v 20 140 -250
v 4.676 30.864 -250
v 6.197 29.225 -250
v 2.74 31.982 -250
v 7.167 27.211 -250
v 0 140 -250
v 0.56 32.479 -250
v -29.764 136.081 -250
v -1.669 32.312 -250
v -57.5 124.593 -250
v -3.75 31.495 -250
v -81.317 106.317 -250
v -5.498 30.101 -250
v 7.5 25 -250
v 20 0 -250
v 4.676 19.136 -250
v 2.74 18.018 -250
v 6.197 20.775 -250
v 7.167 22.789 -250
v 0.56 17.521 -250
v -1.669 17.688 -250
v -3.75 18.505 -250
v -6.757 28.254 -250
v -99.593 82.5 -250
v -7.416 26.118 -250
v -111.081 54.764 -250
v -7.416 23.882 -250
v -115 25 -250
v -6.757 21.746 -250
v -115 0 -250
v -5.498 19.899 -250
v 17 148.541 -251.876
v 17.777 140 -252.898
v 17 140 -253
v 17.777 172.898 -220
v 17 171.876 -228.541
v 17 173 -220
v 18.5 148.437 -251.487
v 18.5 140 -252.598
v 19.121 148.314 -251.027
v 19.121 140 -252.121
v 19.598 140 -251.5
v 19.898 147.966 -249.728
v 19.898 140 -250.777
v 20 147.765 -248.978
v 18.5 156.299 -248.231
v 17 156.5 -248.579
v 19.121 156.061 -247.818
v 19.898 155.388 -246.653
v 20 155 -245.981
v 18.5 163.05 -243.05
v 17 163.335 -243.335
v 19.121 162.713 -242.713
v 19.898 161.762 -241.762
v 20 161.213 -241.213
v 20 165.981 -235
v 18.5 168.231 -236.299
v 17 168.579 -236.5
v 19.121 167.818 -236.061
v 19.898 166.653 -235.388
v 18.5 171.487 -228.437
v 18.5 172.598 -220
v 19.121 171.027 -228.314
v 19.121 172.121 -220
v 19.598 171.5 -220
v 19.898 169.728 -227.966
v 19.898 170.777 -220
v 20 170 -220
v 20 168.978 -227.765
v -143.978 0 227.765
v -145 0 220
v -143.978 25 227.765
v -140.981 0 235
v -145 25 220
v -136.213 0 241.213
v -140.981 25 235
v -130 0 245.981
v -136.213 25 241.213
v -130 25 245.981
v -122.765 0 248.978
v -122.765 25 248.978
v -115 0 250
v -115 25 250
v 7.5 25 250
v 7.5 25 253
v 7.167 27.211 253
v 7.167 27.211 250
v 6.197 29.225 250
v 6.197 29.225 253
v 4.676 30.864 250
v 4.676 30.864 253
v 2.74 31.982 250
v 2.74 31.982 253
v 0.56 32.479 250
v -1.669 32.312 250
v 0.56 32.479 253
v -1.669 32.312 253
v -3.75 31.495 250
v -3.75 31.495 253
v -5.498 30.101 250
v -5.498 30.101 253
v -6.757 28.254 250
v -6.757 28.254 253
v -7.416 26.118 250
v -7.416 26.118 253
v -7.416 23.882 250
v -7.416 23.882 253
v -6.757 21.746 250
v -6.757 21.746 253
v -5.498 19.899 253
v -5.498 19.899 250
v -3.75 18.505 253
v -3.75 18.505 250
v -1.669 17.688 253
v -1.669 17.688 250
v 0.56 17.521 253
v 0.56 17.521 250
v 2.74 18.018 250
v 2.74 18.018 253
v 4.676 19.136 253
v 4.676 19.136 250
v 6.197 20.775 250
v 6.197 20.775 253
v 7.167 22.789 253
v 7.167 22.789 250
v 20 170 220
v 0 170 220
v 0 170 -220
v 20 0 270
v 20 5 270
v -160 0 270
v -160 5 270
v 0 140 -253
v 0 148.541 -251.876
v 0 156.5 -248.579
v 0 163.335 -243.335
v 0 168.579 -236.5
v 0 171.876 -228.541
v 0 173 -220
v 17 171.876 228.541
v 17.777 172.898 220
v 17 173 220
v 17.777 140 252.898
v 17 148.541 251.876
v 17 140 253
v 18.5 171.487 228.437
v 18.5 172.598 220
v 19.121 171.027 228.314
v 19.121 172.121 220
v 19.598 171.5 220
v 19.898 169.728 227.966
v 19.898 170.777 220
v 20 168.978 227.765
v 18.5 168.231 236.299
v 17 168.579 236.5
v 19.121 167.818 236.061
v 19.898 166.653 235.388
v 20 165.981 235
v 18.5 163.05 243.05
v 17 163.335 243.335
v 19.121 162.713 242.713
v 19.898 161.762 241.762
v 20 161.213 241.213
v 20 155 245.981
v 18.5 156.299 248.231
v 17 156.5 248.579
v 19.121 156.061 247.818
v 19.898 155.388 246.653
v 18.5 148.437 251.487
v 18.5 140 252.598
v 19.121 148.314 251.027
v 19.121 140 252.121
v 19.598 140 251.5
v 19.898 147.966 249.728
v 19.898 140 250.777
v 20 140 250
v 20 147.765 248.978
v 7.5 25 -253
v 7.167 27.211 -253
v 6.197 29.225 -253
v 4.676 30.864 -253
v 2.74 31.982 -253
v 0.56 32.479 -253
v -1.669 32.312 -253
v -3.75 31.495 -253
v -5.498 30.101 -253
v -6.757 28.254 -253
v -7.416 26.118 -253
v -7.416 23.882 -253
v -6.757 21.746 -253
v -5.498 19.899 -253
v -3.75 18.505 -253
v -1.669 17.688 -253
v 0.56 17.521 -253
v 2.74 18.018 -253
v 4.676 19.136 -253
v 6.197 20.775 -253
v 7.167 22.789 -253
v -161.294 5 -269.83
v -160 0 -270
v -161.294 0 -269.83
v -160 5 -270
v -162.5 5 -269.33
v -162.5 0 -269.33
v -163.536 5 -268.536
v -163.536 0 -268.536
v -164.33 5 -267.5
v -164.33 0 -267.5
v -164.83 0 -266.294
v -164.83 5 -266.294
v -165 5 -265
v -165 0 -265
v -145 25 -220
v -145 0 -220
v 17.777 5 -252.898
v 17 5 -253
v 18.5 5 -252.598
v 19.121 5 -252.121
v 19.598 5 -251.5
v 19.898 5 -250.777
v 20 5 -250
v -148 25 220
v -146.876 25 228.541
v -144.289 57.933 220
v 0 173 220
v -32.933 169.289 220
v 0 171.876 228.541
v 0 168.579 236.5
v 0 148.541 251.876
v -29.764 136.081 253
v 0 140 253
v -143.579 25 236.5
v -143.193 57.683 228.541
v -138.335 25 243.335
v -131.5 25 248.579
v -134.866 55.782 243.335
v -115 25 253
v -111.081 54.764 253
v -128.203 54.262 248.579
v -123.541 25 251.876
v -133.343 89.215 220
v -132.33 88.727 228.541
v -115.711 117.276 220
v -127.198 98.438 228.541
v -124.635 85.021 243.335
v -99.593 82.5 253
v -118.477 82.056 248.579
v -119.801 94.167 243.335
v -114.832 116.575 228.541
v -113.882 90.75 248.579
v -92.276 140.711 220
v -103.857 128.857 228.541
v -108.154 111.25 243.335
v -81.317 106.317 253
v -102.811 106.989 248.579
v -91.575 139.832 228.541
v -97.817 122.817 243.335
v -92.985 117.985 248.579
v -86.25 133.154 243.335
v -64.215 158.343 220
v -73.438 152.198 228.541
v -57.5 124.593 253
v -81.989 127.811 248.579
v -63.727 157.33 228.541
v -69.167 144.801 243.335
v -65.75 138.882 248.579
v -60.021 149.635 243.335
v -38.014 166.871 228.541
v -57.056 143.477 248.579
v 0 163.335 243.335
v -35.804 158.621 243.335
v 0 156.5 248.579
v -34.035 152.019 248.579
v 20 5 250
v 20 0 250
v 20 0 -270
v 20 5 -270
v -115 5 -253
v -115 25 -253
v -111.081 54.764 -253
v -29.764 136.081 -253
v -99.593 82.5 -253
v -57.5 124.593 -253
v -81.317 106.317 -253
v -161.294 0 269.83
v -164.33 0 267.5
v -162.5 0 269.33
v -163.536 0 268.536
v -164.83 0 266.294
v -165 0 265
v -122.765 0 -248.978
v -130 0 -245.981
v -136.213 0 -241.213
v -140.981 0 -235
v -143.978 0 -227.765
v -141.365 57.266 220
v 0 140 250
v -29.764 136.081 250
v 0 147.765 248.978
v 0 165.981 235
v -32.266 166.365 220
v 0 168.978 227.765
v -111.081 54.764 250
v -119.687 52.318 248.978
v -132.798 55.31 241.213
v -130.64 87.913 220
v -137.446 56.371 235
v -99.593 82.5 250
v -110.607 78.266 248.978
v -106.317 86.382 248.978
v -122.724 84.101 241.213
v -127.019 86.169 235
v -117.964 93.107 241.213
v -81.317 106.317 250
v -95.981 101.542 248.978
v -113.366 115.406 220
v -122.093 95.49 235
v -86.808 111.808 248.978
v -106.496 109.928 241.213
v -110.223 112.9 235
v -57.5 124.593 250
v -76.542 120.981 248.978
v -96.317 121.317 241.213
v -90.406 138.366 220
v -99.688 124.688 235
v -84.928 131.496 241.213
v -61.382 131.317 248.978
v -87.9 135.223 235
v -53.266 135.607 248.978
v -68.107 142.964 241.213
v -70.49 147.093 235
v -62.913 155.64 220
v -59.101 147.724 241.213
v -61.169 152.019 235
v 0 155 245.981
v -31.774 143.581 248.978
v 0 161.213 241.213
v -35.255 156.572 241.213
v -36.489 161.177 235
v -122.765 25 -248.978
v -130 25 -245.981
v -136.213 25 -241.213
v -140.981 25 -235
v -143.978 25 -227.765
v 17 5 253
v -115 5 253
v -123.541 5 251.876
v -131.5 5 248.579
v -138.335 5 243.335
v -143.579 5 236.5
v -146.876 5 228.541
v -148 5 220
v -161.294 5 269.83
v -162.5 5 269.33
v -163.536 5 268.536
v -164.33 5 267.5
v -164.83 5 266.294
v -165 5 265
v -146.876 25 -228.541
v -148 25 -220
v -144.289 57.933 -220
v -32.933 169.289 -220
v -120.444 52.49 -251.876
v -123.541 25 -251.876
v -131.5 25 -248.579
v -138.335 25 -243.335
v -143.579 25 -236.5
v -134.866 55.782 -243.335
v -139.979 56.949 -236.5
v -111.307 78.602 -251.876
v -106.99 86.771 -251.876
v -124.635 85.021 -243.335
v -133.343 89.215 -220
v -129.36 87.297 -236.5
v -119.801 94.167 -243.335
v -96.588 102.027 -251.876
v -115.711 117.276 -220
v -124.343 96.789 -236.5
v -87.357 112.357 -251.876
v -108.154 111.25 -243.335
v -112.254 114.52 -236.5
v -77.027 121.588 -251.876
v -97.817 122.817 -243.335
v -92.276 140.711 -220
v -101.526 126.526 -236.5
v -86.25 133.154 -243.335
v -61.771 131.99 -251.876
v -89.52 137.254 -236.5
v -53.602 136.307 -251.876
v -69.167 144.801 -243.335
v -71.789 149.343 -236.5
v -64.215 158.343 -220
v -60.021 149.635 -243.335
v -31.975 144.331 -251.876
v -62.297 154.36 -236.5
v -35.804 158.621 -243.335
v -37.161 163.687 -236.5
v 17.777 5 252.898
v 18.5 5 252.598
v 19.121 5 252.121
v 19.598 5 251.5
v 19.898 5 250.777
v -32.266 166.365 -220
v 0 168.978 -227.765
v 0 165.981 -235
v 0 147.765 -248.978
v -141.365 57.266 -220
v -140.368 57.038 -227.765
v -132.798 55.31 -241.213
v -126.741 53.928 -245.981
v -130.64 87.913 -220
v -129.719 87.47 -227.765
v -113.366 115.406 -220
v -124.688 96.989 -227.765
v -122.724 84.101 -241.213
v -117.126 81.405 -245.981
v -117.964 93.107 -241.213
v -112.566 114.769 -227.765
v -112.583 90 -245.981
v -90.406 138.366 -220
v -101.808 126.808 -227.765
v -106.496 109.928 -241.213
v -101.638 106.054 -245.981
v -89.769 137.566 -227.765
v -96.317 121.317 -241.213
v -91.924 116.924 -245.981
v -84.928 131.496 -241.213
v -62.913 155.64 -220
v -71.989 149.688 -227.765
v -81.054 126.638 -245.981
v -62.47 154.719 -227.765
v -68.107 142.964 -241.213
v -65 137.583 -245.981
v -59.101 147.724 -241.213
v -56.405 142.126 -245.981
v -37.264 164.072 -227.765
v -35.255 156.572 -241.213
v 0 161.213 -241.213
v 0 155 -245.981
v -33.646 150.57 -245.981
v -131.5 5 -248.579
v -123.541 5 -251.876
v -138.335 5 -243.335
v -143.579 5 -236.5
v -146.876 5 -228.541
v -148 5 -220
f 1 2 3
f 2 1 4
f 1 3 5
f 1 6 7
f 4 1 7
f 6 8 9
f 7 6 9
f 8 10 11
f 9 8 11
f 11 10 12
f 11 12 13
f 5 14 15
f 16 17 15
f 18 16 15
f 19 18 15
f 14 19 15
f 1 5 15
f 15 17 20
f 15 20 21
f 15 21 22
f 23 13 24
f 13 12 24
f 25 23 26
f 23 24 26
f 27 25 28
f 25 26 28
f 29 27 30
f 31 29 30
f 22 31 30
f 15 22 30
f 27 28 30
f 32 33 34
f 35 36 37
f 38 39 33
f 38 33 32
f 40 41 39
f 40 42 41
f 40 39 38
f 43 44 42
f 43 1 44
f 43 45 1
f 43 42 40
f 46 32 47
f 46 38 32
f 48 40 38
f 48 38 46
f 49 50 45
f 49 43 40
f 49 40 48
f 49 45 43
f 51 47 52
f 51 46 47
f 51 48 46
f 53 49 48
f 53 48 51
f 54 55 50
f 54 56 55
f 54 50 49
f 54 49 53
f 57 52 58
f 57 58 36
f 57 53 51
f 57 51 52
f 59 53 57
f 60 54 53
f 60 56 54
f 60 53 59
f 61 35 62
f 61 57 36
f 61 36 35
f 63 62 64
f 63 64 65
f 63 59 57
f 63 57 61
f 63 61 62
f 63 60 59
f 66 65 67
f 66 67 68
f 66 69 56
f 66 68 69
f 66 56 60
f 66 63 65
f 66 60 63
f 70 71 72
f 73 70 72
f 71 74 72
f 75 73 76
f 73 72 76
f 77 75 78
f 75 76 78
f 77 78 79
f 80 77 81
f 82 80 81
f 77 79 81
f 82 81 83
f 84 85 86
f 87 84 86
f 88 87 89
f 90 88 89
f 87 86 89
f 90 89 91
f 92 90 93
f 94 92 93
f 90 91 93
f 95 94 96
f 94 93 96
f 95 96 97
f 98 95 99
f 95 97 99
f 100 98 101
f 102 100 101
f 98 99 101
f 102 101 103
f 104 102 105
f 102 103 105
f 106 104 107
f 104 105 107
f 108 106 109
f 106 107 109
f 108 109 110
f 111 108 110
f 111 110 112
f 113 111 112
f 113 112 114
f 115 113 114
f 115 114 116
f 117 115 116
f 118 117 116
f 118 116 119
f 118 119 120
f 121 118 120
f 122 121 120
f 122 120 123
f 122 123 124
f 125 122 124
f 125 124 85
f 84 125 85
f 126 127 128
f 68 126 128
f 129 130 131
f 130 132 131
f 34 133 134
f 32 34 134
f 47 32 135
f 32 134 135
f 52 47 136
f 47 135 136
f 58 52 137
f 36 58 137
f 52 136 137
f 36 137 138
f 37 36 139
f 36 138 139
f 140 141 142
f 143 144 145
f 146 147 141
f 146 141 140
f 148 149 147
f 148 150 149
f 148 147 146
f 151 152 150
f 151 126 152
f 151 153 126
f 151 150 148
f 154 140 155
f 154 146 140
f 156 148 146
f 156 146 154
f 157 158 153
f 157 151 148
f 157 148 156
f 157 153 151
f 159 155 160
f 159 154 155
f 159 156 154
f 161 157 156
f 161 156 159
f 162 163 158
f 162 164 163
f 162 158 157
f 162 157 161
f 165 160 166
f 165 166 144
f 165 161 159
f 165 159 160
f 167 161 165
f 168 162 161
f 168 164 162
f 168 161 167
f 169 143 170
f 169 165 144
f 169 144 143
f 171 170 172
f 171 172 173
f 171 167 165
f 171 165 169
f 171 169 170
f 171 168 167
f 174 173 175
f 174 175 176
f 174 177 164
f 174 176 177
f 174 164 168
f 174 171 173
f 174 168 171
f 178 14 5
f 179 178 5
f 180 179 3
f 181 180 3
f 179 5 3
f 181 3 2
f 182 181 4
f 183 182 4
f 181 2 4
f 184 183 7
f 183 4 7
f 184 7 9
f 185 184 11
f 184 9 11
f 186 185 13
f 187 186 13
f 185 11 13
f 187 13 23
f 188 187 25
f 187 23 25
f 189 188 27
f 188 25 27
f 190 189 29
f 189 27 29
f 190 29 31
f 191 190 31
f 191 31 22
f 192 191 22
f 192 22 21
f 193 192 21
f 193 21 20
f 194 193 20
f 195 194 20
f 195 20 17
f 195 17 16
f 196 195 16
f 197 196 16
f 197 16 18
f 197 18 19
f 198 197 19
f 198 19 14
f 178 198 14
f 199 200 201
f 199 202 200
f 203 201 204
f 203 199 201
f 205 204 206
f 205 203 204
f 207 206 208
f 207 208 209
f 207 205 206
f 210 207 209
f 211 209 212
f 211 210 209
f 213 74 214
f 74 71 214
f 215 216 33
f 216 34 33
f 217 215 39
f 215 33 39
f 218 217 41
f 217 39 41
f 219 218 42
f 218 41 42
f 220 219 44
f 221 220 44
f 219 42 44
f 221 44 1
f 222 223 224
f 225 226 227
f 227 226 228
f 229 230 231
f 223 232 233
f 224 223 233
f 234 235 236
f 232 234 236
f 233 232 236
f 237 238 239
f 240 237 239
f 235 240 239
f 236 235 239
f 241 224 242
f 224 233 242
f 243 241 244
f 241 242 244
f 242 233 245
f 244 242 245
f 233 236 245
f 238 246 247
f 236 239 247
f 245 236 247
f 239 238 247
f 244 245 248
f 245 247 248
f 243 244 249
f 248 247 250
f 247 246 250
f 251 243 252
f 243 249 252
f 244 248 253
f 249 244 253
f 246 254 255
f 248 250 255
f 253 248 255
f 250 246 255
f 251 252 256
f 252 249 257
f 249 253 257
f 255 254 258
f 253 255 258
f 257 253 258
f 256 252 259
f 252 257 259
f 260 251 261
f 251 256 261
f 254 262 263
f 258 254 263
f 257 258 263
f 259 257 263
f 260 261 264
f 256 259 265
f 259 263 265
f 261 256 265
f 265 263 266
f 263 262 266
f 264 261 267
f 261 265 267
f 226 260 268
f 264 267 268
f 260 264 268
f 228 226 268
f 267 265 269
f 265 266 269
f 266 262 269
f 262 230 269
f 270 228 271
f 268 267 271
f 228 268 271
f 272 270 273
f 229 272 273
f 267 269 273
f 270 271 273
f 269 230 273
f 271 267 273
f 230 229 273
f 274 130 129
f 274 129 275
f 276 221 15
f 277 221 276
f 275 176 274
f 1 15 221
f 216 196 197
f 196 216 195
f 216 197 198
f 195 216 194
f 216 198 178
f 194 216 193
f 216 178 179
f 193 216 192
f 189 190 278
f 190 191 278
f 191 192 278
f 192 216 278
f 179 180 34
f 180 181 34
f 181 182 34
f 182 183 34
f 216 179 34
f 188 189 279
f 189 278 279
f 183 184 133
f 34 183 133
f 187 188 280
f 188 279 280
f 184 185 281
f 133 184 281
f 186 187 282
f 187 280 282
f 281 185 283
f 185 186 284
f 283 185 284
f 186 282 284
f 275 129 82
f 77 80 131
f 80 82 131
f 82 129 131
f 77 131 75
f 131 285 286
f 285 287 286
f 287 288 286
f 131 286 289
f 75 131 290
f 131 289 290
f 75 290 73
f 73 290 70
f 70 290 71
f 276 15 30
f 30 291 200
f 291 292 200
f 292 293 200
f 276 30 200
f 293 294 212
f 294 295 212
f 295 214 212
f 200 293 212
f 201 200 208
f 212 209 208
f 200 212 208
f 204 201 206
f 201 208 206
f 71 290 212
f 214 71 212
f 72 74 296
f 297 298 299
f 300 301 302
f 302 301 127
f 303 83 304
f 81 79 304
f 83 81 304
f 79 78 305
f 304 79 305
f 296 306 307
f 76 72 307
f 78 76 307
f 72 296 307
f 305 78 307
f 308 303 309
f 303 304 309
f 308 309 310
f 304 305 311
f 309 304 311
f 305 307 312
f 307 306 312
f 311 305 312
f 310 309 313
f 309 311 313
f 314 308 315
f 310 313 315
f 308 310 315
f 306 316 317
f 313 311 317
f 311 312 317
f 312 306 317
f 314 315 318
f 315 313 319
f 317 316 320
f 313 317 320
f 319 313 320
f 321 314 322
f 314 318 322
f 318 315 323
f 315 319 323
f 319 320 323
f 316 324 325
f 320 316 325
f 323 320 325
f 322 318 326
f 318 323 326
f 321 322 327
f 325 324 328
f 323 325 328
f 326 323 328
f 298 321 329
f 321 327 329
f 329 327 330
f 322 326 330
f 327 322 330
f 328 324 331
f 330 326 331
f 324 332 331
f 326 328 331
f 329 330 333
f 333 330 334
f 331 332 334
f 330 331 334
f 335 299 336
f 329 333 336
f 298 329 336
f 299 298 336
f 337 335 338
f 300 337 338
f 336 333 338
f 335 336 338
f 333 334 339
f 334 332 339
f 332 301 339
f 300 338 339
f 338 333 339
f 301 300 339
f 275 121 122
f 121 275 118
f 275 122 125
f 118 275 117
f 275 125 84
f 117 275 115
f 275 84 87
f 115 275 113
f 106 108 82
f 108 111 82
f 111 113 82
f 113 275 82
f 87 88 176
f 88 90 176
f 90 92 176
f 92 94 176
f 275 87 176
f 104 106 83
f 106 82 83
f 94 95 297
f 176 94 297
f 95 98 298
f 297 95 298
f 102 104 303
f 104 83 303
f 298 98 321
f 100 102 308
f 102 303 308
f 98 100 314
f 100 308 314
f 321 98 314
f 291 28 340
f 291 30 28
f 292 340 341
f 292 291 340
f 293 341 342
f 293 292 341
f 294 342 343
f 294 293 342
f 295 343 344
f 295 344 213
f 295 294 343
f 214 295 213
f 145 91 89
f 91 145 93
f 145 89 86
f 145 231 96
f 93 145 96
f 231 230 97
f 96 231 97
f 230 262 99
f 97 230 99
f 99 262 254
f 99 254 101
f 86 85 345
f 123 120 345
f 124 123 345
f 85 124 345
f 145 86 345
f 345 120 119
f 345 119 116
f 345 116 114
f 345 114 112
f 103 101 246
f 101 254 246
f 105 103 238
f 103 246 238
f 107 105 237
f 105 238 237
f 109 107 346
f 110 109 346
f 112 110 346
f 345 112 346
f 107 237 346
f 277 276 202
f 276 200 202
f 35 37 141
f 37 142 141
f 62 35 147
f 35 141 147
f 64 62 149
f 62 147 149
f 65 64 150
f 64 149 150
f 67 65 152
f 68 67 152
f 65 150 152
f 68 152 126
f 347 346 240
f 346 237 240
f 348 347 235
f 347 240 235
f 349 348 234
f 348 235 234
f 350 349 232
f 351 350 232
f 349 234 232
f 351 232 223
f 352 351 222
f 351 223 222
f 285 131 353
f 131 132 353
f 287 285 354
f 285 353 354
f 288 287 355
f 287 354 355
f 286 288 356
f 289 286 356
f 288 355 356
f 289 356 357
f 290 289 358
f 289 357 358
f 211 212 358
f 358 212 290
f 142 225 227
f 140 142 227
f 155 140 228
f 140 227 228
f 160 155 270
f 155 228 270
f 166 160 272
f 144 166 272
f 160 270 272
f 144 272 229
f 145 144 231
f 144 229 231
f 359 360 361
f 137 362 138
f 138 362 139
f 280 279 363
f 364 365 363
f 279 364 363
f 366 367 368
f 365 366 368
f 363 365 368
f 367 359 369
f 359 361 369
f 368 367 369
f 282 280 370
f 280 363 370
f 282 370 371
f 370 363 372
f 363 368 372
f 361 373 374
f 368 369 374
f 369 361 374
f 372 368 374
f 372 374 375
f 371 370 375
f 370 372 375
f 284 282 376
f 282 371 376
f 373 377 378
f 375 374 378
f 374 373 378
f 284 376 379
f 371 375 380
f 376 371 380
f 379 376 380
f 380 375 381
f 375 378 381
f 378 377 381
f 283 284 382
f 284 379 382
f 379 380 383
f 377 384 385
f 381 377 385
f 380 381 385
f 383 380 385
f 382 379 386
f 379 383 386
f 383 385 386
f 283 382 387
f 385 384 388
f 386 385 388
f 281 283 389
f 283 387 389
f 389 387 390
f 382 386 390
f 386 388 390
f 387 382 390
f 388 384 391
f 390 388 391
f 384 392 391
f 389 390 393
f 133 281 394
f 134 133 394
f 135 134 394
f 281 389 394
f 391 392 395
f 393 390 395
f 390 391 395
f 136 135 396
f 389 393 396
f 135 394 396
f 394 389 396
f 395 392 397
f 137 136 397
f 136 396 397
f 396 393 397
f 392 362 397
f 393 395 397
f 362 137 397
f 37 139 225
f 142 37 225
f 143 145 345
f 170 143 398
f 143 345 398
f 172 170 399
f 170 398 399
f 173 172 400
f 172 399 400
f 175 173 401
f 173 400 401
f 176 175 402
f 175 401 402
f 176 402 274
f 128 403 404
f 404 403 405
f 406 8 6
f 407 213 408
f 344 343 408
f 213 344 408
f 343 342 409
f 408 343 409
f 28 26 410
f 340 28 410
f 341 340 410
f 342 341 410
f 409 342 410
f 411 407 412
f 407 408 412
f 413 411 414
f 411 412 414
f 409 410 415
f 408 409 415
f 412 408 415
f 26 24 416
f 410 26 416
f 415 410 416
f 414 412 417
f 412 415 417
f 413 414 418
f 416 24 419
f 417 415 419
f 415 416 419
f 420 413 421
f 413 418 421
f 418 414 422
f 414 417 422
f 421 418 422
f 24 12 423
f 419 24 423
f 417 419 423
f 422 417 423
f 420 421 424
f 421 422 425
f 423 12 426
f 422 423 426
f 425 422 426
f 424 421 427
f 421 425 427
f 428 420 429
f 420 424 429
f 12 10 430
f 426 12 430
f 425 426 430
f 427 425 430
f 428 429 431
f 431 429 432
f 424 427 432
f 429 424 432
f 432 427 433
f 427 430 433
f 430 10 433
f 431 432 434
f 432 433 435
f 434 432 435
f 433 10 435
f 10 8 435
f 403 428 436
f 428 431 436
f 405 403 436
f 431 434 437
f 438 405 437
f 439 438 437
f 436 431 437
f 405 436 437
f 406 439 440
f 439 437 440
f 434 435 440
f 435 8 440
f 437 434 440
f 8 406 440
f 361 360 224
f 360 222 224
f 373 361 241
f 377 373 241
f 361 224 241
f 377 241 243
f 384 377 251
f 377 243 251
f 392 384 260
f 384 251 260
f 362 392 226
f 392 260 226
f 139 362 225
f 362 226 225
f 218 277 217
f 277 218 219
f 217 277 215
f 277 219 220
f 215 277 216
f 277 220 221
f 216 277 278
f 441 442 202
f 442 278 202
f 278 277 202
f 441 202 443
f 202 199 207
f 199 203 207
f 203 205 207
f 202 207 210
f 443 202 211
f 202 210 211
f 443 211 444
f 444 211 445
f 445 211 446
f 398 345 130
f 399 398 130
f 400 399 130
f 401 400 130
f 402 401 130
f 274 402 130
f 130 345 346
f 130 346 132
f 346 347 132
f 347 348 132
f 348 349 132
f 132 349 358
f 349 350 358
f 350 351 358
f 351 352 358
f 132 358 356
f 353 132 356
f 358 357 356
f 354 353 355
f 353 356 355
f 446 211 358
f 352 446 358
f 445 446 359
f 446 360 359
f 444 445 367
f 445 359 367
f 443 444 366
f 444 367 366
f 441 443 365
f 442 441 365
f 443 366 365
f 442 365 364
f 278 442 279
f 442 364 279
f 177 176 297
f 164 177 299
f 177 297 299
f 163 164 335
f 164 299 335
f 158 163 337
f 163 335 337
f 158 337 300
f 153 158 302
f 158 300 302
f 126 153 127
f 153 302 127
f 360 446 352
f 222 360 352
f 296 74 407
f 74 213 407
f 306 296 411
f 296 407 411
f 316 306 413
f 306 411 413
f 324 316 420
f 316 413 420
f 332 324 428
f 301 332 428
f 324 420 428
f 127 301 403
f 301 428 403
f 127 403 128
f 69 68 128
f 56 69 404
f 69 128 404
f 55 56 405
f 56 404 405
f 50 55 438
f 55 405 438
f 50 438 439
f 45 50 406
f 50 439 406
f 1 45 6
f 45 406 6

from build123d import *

# Parameters (mm, degrees)
BOSS_EXTRUDE1_DEPTH = 5
BOSS_EXTRUDE3_DEPTH = 20
FILLET5_R           = 30
FILLET6_R           = 33
FILLET4_R           = 5
REVOLVE3_ANGLE      = 90
BOSS_EXTRUDE4_DEPTH = 20
CUT_EXTRUDE1_REACH  = 577.05
SKETCH10_R          = 7.5
FILLET7_R           = 3


with BuildPart() as part:
    # Sketch1 → Boss-Extrude1 (new body)
    with BuildSketch(Plane(origin=(0, 0, 0), x_dir=(1, 0, 0), z_dir=(0, 1, 0))):
        Polygon((-165, 270), (-165, -270), (0, -270), (0, -250), (-145, -250), (-145, 250), (0, 250), (0, 270), align=None)
    extrude(amount=BOSS_EXTRUDE1_DEPTH)

    # Sketch7 → Boss-Extrude3 (add)
    with BuildSketch(Plane(origin=(0, 5, 0), x_dir=(1, 0, 0), z_dir=(0, 1, 0))):
        Polygon((0, 253), (-148, 253), (-148, -253), (0, -253), (0, -250), (-145, -250), (-145, 250), (0, 250), align=None)
    extrude(amount=BOSS_EXTRUDE3_DEPTH)

    # Fillet5
    fillet5_edges = [part.edges().sort_by_distance(p)[0] for p in [
        (-145, 12.5, -250),
        (-145, 12.5, 250),
    ]]
    fillet(fillet5_edges, radius=FILLET5_R)

    # Fillet6
    fillet6_edges = [part.edges().sort_by_distance(p)[0] for p in [
        (-148, 15, -253),
        (-148, 15, 253),
    ]]
    fillet(fillet6_edges, radius=FILLET6_R)

    # Fillet4
    fillet4_edges = [part.edges().sort_by_distance(p)[0] for p in [
        (-165, 2.5, 270),
        (-165, 2.5, -270),
    ]]
    fillet(fillet4_edges, radius=FILLET4_R)

    # Sketch8 → Revolve3 (revolve)
    with BuildSketch(Plane(origin=(0, 25, 0), x_dir=(1, 0, 0), z_dir=(0, 1, 0))):
        with BuildLine():
            Line((0, 253), (-115, 253))
            ThreePointArc((-115, 253), (-138.334523779, 243.334523779), (-148, 220))
            Line((-148, 220), (-148, -220))
            ThreePointArc((-148, -220), (-138.334523779, -243.334523779), (-115, -253))
            Line((-115, -253), (0, -253))
            Line((0, -253), (0, -250))
            Line((0, -250), (-115, -250))
            ThreePointArc((-115, -250), (-136.213203436, -241.213203436), (-145, -220))
            Line((-145, -220), (-145, 220))
            ThreePointArc((-145, 220), (-136.213203436, 241.213203436), (-115, 250))
            Line((-115, 250), (0, 250))
            Line((0, 250), (0, 253))
        make_face()
    revolve(axis=Axis((0, 25, -250), (0, 0, -1)), revolution_arc=REVOLVE3_ANGLE)

    # Sketch9 → Boss-Extrude4 (add)
    with BuildSketch(Plane(origin=(0, 0, 0), x_dir=(0, 0, -1), z_dir=(1, 0, 0))):
        with BuildLine():
            Line((253, 25), (253, 140))
            ThreePointArc((253, 140), (243.334523779, 163.334523779), (220, 173))
            Line((220, 173), (-220, 173))
            ThreePointArc((-220, 173), (-243.334523779, 163.334523779), (-253, 140))
            Line((-253, 140), (-253, 25))
            Line((-253, 25), (-253, 5))
            Line((-253, 5), (-270, 5))
            Line((-270, 5), (-270, 0))
            Line((-270, 0), (-250, 0))
            Line((-250, 0), (-250, 25))
            Line((-250, 25), (-250, 140))
            ThreePointArc((-250, 140), (-241.213203436, 161.213203436), (-220, 170))
            Line((-220, 170), (220, 170))
            ThreePointArc((220, 170), (241.213203436, 161.213203436), (250, 140))
            Line((250, 140), (250, 25))
            Line((250, 25), (250, 0))
            Line((250, 0), (270, 0))
            Line((270, 0), (270, 5))
            Line((270, 5), (253, 5))
            Line((253, 5), (253, 25))
        make_face()
    extrude(amount=BOSS_EXTRUDE4_DEPTH)

    # Cut-Extrude1: up to this face of the body (flat: up to its plane)
    cut_extrude1_end = Plane(part.part.faces().sort_by_distance((-39.787657223, 64.787657223, -253))[0])
    # Sketch10 → Cut-Extrude1 (cut, up to the picked face)
    with BuildSketch(Plane.XY.offset(253), mode=Mode.PRIVATE) as cut_extrude1_sk1:
        with Locations((0, 25)):
            Circle(SKETCH10_R)
    cut_extrude1_tool1 = split(extrude(cut_extrude1_sk1.sketch, amount=-CUT_EXTRUDE1_REACH, mode=Mode.PRIVATE), bisect_by=cut_extrude1_end, keep=Keep.BOTH, mode=Mode.PRIVATE)
    add(cut_extrude1_tool1.solids().sort_by(Axis((0, 25, 253), (0, 0, -1)))[0], mode=Mode.SUBTRACT)

    # Fillet7
    fillet7_edges = [part.edges().sort_by_distance(p)[0] for p in [
        (20, 72.5, -253),
        (20, 163.334523779, -243.334523779),
        (20, 173, 0),
        (20, 163.334523779, 243.334523779),
        (20, 72.5, 253),
    ]]
    fillet(fillet7_edges, radius=FILLET7_R - 0.0001)  # a hair under: the kernel refuses the full size


solid = part.part
